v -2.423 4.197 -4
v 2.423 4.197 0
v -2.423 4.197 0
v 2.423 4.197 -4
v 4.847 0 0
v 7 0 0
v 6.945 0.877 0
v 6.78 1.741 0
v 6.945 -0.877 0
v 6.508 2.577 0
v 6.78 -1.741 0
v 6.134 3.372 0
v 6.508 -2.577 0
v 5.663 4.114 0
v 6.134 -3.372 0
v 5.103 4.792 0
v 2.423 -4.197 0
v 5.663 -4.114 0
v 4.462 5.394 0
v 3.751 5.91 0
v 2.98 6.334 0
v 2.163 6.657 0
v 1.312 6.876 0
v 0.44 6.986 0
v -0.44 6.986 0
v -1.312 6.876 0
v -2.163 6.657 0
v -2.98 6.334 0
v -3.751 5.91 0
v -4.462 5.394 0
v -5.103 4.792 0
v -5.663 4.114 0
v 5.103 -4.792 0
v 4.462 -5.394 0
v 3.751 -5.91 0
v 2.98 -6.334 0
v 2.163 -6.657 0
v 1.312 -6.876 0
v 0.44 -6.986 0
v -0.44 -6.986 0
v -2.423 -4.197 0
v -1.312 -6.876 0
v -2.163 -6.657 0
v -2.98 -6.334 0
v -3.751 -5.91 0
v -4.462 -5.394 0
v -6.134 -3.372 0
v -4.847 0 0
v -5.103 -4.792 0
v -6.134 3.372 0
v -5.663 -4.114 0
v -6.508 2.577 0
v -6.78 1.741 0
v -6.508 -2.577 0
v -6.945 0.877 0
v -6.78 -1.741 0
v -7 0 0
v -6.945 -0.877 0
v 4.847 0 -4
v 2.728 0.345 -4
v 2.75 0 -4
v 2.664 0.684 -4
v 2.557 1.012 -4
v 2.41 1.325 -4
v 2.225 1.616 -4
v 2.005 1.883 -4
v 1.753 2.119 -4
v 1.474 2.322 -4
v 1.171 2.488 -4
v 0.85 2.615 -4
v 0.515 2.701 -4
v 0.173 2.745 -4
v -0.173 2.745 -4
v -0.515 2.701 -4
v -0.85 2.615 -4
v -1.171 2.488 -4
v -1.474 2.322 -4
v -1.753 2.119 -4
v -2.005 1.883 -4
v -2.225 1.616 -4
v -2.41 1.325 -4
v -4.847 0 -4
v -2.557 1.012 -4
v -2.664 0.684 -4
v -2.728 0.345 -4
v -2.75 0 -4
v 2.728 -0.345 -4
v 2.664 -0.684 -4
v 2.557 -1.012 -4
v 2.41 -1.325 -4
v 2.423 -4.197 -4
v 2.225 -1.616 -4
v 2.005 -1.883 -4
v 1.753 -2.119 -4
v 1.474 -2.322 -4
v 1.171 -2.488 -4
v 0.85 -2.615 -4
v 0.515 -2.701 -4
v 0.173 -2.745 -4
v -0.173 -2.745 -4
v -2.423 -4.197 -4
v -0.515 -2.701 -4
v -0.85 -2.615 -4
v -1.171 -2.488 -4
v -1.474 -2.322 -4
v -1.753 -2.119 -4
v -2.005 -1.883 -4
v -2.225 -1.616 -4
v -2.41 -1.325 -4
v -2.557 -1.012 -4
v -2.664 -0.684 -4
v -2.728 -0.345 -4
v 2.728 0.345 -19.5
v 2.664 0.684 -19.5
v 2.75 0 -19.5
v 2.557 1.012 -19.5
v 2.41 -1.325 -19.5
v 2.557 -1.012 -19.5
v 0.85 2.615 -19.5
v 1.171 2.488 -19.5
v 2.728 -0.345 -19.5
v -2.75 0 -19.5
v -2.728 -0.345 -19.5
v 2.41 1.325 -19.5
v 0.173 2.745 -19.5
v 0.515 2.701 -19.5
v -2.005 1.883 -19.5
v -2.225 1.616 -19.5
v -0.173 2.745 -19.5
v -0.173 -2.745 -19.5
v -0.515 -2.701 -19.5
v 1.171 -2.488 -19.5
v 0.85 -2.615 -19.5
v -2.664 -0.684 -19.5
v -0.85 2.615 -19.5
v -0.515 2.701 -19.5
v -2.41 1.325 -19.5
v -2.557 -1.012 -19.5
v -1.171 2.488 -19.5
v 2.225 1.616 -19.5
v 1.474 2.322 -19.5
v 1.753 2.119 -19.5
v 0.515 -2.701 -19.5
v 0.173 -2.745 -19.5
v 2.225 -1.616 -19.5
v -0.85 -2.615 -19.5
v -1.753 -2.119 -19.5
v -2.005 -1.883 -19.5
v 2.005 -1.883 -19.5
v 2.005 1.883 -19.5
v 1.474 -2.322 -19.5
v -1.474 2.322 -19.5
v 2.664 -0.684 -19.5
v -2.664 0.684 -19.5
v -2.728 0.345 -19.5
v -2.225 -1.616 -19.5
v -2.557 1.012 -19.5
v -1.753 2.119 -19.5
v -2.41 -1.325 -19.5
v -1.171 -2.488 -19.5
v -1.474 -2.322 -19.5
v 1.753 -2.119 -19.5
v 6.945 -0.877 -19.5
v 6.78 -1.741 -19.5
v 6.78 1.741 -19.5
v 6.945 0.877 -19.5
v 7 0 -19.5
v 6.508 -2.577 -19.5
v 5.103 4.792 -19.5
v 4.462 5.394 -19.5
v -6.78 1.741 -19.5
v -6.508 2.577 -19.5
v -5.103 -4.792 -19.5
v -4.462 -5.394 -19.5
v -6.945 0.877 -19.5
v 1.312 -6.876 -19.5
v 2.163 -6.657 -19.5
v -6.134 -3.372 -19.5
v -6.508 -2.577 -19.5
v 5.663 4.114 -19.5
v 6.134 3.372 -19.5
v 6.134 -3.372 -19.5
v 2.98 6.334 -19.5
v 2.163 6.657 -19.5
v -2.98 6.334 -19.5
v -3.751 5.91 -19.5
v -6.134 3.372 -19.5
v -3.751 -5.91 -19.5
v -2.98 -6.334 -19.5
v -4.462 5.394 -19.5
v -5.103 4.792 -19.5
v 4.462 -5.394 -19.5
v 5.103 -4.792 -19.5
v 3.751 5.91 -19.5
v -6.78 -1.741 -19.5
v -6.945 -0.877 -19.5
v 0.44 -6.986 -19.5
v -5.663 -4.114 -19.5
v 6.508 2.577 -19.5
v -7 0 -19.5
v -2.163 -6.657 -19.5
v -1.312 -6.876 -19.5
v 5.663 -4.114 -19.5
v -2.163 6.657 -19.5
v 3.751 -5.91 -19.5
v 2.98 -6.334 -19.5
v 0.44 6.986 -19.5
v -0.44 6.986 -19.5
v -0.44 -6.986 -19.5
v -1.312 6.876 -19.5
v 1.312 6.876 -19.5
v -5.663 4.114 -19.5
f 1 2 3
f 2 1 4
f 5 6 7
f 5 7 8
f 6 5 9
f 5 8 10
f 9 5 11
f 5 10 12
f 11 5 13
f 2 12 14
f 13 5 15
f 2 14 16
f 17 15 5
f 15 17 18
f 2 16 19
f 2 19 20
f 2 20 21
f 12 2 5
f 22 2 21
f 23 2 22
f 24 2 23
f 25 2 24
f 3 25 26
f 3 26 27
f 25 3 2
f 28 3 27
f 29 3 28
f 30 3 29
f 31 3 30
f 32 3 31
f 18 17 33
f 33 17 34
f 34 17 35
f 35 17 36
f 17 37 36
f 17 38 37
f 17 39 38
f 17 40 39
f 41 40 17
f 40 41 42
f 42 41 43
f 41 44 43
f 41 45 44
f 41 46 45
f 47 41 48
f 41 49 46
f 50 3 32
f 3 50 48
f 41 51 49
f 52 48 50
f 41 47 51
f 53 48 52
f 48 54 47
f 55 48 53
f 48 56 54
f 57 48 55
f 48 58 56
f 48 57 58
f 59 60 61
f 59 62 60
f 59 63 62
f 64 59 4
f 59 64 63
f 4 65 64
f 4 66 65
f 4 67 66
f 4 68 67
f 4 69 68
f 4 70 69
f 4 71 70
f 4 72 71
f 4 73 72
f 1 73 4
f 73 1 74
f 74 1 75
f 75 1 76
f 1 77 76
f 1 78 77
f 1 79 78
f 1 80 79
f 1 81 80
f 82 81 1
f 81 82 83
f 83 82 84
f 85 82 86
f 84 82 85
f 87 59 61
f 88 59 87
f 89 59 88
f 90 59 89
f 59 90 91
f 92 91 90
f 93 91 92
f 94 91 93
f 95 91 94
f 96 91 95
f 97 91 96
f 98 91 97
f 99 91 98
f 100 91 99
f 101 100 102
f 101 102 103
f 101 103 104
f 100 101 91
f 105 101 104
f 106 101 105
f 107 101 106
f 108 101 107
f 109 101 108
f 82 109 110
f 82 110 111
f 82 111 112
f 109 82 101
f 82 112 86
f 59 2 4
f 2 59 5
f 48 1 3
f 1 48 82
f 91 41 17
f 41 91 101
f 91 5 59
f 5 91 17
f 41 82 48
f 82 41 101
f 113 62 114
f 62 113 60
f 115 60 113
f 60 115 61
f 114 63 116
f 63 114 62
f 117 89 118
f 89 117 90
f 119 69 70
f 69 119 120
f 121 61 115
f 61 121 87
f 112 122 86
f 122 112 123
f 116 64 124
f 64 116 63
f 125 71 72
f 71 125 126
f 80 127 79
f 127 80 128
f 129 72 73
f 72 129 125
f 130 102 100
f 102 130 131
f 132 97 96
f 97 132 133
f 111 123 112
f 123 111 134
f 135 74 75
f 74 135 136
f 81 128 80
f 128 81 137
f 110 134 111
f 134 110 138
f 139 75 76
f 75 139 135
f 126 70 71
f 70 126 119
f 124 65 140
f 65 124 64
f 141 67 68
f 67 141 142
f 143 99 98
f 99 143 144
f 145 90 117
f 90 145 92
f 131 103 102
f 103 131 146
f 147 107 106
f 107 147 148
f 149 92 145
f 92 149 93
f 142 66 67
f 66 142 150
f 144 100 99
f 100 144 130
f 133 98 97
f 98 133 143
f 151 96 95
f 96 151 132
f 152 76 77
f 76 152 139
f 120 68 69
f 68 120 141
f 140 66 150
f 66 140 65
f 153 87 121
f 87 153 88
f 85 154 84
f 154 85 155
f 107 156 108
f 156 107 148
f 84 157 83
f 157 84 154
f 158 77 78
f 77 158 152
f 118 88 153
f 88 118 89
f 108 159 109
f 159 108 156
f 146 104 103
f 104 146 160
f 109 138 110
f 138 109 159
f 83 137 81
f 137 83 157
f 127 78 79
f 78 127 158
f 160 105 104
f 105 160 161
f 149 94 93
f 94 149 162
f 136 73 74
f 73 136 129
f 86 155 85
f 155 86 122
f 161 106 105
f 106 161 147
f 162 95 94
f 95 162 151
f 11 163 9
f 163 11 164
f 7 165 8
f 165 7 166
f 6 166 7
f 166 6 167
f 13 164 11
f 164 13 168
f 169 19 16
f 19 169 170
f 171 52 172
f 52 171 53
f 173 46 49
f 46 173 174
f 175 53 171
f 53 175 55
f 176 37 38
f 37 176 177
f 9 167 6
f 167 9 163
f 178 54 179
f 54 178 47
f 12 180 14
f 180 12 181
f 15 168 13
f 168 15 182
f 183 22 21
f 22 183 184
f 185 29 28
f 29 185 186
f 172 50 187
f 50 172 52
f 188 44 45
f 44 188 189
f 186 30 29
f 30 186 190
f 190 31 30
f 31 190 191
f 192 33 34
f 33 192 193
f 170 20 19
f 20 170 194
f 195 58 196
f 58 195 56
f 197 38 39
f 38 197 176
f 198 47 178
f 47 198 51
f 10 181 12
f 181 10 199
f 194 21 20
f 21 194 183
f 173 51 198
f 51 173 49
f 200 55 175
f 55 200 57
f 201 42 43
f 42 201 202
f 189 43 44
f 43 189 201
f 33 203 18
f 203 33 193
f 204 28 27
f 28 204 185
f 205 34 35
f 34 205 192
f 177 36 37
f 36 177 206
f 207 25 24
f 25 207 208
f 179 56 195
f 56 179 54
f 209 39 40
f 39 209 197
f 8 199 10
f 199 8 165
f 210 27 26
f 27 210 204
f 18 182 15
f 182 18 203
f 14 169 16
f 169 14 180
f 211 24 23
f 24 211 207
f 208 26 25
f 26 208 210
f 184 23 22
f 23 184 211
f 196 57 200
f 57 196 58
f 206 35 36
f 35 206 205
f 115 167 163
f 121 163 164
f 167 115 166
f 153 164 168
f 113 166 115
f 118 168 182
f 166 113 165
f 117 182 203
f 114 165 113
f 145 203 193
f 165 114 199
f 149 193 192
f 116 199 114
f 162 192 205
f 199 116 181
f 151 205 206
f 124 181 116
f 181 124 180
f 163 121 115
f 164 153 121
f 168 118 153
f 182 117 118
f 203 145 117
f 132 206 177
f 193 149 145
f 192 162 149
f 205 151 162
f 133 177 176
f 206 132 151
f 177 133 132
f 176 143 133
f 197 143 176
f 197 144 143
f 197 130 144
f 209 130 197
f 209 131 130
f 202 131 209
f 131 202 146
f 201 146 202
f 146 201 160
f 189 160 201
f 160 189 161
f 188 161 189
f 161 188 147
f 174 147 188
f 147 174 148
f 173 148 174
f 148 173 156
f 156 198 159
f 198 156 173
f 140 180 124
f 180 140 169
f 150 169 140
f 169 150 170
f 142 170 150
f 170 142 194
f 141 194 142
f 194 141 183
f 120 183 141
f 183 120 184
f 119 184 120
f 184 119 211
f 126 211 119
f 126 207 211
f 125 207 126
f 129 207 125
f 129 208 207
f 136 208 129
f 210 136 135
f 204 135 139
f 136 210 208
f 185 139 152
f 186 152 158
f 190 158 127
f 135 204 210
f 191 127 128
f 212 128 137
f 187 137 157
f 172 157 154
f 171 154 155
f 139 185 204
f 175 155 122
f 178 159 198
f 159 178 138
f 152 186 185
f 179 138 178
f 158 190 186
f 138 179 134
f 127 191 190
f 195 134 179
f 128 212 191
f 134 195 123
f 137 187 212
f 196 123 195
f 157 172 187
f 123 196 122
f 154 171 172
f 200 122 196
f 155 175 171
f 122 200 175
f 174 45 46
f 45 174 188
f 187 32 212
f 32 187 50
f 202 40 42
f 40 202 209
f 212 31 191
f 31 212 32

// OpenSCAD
$fn = 50;

difference() {
	union() {
		translate(v = [0, 0, -19.5]) {
			cylinder(h = 19.5, r = 7.0);
		}
	}
	union() {
		translate(v = [0, 0, 0]) {
			rotate(a = [0, 0, 0]) {
				difference() {
					union() {
						translate(v = [0, 0, -4]) {
							linear_extrude(height = 4) {
								polygon(points = [[4.8468, 0.0], [2.4234000000000004, 4.197451927062417], [-2.423399999999999, 4.197451927062417], [-4.8468, 5.935618106107392e-16], [-2.423400000000002, -4.197451927062416], [2.423399999999997, -4.197451927062419]]);
							}
						}
					}
					union();
				}
			}
		}
		#translate(v = [0, 0, -100.0]) {
			cylinder(h = 200, r = 2.75);
		}
	}
}
